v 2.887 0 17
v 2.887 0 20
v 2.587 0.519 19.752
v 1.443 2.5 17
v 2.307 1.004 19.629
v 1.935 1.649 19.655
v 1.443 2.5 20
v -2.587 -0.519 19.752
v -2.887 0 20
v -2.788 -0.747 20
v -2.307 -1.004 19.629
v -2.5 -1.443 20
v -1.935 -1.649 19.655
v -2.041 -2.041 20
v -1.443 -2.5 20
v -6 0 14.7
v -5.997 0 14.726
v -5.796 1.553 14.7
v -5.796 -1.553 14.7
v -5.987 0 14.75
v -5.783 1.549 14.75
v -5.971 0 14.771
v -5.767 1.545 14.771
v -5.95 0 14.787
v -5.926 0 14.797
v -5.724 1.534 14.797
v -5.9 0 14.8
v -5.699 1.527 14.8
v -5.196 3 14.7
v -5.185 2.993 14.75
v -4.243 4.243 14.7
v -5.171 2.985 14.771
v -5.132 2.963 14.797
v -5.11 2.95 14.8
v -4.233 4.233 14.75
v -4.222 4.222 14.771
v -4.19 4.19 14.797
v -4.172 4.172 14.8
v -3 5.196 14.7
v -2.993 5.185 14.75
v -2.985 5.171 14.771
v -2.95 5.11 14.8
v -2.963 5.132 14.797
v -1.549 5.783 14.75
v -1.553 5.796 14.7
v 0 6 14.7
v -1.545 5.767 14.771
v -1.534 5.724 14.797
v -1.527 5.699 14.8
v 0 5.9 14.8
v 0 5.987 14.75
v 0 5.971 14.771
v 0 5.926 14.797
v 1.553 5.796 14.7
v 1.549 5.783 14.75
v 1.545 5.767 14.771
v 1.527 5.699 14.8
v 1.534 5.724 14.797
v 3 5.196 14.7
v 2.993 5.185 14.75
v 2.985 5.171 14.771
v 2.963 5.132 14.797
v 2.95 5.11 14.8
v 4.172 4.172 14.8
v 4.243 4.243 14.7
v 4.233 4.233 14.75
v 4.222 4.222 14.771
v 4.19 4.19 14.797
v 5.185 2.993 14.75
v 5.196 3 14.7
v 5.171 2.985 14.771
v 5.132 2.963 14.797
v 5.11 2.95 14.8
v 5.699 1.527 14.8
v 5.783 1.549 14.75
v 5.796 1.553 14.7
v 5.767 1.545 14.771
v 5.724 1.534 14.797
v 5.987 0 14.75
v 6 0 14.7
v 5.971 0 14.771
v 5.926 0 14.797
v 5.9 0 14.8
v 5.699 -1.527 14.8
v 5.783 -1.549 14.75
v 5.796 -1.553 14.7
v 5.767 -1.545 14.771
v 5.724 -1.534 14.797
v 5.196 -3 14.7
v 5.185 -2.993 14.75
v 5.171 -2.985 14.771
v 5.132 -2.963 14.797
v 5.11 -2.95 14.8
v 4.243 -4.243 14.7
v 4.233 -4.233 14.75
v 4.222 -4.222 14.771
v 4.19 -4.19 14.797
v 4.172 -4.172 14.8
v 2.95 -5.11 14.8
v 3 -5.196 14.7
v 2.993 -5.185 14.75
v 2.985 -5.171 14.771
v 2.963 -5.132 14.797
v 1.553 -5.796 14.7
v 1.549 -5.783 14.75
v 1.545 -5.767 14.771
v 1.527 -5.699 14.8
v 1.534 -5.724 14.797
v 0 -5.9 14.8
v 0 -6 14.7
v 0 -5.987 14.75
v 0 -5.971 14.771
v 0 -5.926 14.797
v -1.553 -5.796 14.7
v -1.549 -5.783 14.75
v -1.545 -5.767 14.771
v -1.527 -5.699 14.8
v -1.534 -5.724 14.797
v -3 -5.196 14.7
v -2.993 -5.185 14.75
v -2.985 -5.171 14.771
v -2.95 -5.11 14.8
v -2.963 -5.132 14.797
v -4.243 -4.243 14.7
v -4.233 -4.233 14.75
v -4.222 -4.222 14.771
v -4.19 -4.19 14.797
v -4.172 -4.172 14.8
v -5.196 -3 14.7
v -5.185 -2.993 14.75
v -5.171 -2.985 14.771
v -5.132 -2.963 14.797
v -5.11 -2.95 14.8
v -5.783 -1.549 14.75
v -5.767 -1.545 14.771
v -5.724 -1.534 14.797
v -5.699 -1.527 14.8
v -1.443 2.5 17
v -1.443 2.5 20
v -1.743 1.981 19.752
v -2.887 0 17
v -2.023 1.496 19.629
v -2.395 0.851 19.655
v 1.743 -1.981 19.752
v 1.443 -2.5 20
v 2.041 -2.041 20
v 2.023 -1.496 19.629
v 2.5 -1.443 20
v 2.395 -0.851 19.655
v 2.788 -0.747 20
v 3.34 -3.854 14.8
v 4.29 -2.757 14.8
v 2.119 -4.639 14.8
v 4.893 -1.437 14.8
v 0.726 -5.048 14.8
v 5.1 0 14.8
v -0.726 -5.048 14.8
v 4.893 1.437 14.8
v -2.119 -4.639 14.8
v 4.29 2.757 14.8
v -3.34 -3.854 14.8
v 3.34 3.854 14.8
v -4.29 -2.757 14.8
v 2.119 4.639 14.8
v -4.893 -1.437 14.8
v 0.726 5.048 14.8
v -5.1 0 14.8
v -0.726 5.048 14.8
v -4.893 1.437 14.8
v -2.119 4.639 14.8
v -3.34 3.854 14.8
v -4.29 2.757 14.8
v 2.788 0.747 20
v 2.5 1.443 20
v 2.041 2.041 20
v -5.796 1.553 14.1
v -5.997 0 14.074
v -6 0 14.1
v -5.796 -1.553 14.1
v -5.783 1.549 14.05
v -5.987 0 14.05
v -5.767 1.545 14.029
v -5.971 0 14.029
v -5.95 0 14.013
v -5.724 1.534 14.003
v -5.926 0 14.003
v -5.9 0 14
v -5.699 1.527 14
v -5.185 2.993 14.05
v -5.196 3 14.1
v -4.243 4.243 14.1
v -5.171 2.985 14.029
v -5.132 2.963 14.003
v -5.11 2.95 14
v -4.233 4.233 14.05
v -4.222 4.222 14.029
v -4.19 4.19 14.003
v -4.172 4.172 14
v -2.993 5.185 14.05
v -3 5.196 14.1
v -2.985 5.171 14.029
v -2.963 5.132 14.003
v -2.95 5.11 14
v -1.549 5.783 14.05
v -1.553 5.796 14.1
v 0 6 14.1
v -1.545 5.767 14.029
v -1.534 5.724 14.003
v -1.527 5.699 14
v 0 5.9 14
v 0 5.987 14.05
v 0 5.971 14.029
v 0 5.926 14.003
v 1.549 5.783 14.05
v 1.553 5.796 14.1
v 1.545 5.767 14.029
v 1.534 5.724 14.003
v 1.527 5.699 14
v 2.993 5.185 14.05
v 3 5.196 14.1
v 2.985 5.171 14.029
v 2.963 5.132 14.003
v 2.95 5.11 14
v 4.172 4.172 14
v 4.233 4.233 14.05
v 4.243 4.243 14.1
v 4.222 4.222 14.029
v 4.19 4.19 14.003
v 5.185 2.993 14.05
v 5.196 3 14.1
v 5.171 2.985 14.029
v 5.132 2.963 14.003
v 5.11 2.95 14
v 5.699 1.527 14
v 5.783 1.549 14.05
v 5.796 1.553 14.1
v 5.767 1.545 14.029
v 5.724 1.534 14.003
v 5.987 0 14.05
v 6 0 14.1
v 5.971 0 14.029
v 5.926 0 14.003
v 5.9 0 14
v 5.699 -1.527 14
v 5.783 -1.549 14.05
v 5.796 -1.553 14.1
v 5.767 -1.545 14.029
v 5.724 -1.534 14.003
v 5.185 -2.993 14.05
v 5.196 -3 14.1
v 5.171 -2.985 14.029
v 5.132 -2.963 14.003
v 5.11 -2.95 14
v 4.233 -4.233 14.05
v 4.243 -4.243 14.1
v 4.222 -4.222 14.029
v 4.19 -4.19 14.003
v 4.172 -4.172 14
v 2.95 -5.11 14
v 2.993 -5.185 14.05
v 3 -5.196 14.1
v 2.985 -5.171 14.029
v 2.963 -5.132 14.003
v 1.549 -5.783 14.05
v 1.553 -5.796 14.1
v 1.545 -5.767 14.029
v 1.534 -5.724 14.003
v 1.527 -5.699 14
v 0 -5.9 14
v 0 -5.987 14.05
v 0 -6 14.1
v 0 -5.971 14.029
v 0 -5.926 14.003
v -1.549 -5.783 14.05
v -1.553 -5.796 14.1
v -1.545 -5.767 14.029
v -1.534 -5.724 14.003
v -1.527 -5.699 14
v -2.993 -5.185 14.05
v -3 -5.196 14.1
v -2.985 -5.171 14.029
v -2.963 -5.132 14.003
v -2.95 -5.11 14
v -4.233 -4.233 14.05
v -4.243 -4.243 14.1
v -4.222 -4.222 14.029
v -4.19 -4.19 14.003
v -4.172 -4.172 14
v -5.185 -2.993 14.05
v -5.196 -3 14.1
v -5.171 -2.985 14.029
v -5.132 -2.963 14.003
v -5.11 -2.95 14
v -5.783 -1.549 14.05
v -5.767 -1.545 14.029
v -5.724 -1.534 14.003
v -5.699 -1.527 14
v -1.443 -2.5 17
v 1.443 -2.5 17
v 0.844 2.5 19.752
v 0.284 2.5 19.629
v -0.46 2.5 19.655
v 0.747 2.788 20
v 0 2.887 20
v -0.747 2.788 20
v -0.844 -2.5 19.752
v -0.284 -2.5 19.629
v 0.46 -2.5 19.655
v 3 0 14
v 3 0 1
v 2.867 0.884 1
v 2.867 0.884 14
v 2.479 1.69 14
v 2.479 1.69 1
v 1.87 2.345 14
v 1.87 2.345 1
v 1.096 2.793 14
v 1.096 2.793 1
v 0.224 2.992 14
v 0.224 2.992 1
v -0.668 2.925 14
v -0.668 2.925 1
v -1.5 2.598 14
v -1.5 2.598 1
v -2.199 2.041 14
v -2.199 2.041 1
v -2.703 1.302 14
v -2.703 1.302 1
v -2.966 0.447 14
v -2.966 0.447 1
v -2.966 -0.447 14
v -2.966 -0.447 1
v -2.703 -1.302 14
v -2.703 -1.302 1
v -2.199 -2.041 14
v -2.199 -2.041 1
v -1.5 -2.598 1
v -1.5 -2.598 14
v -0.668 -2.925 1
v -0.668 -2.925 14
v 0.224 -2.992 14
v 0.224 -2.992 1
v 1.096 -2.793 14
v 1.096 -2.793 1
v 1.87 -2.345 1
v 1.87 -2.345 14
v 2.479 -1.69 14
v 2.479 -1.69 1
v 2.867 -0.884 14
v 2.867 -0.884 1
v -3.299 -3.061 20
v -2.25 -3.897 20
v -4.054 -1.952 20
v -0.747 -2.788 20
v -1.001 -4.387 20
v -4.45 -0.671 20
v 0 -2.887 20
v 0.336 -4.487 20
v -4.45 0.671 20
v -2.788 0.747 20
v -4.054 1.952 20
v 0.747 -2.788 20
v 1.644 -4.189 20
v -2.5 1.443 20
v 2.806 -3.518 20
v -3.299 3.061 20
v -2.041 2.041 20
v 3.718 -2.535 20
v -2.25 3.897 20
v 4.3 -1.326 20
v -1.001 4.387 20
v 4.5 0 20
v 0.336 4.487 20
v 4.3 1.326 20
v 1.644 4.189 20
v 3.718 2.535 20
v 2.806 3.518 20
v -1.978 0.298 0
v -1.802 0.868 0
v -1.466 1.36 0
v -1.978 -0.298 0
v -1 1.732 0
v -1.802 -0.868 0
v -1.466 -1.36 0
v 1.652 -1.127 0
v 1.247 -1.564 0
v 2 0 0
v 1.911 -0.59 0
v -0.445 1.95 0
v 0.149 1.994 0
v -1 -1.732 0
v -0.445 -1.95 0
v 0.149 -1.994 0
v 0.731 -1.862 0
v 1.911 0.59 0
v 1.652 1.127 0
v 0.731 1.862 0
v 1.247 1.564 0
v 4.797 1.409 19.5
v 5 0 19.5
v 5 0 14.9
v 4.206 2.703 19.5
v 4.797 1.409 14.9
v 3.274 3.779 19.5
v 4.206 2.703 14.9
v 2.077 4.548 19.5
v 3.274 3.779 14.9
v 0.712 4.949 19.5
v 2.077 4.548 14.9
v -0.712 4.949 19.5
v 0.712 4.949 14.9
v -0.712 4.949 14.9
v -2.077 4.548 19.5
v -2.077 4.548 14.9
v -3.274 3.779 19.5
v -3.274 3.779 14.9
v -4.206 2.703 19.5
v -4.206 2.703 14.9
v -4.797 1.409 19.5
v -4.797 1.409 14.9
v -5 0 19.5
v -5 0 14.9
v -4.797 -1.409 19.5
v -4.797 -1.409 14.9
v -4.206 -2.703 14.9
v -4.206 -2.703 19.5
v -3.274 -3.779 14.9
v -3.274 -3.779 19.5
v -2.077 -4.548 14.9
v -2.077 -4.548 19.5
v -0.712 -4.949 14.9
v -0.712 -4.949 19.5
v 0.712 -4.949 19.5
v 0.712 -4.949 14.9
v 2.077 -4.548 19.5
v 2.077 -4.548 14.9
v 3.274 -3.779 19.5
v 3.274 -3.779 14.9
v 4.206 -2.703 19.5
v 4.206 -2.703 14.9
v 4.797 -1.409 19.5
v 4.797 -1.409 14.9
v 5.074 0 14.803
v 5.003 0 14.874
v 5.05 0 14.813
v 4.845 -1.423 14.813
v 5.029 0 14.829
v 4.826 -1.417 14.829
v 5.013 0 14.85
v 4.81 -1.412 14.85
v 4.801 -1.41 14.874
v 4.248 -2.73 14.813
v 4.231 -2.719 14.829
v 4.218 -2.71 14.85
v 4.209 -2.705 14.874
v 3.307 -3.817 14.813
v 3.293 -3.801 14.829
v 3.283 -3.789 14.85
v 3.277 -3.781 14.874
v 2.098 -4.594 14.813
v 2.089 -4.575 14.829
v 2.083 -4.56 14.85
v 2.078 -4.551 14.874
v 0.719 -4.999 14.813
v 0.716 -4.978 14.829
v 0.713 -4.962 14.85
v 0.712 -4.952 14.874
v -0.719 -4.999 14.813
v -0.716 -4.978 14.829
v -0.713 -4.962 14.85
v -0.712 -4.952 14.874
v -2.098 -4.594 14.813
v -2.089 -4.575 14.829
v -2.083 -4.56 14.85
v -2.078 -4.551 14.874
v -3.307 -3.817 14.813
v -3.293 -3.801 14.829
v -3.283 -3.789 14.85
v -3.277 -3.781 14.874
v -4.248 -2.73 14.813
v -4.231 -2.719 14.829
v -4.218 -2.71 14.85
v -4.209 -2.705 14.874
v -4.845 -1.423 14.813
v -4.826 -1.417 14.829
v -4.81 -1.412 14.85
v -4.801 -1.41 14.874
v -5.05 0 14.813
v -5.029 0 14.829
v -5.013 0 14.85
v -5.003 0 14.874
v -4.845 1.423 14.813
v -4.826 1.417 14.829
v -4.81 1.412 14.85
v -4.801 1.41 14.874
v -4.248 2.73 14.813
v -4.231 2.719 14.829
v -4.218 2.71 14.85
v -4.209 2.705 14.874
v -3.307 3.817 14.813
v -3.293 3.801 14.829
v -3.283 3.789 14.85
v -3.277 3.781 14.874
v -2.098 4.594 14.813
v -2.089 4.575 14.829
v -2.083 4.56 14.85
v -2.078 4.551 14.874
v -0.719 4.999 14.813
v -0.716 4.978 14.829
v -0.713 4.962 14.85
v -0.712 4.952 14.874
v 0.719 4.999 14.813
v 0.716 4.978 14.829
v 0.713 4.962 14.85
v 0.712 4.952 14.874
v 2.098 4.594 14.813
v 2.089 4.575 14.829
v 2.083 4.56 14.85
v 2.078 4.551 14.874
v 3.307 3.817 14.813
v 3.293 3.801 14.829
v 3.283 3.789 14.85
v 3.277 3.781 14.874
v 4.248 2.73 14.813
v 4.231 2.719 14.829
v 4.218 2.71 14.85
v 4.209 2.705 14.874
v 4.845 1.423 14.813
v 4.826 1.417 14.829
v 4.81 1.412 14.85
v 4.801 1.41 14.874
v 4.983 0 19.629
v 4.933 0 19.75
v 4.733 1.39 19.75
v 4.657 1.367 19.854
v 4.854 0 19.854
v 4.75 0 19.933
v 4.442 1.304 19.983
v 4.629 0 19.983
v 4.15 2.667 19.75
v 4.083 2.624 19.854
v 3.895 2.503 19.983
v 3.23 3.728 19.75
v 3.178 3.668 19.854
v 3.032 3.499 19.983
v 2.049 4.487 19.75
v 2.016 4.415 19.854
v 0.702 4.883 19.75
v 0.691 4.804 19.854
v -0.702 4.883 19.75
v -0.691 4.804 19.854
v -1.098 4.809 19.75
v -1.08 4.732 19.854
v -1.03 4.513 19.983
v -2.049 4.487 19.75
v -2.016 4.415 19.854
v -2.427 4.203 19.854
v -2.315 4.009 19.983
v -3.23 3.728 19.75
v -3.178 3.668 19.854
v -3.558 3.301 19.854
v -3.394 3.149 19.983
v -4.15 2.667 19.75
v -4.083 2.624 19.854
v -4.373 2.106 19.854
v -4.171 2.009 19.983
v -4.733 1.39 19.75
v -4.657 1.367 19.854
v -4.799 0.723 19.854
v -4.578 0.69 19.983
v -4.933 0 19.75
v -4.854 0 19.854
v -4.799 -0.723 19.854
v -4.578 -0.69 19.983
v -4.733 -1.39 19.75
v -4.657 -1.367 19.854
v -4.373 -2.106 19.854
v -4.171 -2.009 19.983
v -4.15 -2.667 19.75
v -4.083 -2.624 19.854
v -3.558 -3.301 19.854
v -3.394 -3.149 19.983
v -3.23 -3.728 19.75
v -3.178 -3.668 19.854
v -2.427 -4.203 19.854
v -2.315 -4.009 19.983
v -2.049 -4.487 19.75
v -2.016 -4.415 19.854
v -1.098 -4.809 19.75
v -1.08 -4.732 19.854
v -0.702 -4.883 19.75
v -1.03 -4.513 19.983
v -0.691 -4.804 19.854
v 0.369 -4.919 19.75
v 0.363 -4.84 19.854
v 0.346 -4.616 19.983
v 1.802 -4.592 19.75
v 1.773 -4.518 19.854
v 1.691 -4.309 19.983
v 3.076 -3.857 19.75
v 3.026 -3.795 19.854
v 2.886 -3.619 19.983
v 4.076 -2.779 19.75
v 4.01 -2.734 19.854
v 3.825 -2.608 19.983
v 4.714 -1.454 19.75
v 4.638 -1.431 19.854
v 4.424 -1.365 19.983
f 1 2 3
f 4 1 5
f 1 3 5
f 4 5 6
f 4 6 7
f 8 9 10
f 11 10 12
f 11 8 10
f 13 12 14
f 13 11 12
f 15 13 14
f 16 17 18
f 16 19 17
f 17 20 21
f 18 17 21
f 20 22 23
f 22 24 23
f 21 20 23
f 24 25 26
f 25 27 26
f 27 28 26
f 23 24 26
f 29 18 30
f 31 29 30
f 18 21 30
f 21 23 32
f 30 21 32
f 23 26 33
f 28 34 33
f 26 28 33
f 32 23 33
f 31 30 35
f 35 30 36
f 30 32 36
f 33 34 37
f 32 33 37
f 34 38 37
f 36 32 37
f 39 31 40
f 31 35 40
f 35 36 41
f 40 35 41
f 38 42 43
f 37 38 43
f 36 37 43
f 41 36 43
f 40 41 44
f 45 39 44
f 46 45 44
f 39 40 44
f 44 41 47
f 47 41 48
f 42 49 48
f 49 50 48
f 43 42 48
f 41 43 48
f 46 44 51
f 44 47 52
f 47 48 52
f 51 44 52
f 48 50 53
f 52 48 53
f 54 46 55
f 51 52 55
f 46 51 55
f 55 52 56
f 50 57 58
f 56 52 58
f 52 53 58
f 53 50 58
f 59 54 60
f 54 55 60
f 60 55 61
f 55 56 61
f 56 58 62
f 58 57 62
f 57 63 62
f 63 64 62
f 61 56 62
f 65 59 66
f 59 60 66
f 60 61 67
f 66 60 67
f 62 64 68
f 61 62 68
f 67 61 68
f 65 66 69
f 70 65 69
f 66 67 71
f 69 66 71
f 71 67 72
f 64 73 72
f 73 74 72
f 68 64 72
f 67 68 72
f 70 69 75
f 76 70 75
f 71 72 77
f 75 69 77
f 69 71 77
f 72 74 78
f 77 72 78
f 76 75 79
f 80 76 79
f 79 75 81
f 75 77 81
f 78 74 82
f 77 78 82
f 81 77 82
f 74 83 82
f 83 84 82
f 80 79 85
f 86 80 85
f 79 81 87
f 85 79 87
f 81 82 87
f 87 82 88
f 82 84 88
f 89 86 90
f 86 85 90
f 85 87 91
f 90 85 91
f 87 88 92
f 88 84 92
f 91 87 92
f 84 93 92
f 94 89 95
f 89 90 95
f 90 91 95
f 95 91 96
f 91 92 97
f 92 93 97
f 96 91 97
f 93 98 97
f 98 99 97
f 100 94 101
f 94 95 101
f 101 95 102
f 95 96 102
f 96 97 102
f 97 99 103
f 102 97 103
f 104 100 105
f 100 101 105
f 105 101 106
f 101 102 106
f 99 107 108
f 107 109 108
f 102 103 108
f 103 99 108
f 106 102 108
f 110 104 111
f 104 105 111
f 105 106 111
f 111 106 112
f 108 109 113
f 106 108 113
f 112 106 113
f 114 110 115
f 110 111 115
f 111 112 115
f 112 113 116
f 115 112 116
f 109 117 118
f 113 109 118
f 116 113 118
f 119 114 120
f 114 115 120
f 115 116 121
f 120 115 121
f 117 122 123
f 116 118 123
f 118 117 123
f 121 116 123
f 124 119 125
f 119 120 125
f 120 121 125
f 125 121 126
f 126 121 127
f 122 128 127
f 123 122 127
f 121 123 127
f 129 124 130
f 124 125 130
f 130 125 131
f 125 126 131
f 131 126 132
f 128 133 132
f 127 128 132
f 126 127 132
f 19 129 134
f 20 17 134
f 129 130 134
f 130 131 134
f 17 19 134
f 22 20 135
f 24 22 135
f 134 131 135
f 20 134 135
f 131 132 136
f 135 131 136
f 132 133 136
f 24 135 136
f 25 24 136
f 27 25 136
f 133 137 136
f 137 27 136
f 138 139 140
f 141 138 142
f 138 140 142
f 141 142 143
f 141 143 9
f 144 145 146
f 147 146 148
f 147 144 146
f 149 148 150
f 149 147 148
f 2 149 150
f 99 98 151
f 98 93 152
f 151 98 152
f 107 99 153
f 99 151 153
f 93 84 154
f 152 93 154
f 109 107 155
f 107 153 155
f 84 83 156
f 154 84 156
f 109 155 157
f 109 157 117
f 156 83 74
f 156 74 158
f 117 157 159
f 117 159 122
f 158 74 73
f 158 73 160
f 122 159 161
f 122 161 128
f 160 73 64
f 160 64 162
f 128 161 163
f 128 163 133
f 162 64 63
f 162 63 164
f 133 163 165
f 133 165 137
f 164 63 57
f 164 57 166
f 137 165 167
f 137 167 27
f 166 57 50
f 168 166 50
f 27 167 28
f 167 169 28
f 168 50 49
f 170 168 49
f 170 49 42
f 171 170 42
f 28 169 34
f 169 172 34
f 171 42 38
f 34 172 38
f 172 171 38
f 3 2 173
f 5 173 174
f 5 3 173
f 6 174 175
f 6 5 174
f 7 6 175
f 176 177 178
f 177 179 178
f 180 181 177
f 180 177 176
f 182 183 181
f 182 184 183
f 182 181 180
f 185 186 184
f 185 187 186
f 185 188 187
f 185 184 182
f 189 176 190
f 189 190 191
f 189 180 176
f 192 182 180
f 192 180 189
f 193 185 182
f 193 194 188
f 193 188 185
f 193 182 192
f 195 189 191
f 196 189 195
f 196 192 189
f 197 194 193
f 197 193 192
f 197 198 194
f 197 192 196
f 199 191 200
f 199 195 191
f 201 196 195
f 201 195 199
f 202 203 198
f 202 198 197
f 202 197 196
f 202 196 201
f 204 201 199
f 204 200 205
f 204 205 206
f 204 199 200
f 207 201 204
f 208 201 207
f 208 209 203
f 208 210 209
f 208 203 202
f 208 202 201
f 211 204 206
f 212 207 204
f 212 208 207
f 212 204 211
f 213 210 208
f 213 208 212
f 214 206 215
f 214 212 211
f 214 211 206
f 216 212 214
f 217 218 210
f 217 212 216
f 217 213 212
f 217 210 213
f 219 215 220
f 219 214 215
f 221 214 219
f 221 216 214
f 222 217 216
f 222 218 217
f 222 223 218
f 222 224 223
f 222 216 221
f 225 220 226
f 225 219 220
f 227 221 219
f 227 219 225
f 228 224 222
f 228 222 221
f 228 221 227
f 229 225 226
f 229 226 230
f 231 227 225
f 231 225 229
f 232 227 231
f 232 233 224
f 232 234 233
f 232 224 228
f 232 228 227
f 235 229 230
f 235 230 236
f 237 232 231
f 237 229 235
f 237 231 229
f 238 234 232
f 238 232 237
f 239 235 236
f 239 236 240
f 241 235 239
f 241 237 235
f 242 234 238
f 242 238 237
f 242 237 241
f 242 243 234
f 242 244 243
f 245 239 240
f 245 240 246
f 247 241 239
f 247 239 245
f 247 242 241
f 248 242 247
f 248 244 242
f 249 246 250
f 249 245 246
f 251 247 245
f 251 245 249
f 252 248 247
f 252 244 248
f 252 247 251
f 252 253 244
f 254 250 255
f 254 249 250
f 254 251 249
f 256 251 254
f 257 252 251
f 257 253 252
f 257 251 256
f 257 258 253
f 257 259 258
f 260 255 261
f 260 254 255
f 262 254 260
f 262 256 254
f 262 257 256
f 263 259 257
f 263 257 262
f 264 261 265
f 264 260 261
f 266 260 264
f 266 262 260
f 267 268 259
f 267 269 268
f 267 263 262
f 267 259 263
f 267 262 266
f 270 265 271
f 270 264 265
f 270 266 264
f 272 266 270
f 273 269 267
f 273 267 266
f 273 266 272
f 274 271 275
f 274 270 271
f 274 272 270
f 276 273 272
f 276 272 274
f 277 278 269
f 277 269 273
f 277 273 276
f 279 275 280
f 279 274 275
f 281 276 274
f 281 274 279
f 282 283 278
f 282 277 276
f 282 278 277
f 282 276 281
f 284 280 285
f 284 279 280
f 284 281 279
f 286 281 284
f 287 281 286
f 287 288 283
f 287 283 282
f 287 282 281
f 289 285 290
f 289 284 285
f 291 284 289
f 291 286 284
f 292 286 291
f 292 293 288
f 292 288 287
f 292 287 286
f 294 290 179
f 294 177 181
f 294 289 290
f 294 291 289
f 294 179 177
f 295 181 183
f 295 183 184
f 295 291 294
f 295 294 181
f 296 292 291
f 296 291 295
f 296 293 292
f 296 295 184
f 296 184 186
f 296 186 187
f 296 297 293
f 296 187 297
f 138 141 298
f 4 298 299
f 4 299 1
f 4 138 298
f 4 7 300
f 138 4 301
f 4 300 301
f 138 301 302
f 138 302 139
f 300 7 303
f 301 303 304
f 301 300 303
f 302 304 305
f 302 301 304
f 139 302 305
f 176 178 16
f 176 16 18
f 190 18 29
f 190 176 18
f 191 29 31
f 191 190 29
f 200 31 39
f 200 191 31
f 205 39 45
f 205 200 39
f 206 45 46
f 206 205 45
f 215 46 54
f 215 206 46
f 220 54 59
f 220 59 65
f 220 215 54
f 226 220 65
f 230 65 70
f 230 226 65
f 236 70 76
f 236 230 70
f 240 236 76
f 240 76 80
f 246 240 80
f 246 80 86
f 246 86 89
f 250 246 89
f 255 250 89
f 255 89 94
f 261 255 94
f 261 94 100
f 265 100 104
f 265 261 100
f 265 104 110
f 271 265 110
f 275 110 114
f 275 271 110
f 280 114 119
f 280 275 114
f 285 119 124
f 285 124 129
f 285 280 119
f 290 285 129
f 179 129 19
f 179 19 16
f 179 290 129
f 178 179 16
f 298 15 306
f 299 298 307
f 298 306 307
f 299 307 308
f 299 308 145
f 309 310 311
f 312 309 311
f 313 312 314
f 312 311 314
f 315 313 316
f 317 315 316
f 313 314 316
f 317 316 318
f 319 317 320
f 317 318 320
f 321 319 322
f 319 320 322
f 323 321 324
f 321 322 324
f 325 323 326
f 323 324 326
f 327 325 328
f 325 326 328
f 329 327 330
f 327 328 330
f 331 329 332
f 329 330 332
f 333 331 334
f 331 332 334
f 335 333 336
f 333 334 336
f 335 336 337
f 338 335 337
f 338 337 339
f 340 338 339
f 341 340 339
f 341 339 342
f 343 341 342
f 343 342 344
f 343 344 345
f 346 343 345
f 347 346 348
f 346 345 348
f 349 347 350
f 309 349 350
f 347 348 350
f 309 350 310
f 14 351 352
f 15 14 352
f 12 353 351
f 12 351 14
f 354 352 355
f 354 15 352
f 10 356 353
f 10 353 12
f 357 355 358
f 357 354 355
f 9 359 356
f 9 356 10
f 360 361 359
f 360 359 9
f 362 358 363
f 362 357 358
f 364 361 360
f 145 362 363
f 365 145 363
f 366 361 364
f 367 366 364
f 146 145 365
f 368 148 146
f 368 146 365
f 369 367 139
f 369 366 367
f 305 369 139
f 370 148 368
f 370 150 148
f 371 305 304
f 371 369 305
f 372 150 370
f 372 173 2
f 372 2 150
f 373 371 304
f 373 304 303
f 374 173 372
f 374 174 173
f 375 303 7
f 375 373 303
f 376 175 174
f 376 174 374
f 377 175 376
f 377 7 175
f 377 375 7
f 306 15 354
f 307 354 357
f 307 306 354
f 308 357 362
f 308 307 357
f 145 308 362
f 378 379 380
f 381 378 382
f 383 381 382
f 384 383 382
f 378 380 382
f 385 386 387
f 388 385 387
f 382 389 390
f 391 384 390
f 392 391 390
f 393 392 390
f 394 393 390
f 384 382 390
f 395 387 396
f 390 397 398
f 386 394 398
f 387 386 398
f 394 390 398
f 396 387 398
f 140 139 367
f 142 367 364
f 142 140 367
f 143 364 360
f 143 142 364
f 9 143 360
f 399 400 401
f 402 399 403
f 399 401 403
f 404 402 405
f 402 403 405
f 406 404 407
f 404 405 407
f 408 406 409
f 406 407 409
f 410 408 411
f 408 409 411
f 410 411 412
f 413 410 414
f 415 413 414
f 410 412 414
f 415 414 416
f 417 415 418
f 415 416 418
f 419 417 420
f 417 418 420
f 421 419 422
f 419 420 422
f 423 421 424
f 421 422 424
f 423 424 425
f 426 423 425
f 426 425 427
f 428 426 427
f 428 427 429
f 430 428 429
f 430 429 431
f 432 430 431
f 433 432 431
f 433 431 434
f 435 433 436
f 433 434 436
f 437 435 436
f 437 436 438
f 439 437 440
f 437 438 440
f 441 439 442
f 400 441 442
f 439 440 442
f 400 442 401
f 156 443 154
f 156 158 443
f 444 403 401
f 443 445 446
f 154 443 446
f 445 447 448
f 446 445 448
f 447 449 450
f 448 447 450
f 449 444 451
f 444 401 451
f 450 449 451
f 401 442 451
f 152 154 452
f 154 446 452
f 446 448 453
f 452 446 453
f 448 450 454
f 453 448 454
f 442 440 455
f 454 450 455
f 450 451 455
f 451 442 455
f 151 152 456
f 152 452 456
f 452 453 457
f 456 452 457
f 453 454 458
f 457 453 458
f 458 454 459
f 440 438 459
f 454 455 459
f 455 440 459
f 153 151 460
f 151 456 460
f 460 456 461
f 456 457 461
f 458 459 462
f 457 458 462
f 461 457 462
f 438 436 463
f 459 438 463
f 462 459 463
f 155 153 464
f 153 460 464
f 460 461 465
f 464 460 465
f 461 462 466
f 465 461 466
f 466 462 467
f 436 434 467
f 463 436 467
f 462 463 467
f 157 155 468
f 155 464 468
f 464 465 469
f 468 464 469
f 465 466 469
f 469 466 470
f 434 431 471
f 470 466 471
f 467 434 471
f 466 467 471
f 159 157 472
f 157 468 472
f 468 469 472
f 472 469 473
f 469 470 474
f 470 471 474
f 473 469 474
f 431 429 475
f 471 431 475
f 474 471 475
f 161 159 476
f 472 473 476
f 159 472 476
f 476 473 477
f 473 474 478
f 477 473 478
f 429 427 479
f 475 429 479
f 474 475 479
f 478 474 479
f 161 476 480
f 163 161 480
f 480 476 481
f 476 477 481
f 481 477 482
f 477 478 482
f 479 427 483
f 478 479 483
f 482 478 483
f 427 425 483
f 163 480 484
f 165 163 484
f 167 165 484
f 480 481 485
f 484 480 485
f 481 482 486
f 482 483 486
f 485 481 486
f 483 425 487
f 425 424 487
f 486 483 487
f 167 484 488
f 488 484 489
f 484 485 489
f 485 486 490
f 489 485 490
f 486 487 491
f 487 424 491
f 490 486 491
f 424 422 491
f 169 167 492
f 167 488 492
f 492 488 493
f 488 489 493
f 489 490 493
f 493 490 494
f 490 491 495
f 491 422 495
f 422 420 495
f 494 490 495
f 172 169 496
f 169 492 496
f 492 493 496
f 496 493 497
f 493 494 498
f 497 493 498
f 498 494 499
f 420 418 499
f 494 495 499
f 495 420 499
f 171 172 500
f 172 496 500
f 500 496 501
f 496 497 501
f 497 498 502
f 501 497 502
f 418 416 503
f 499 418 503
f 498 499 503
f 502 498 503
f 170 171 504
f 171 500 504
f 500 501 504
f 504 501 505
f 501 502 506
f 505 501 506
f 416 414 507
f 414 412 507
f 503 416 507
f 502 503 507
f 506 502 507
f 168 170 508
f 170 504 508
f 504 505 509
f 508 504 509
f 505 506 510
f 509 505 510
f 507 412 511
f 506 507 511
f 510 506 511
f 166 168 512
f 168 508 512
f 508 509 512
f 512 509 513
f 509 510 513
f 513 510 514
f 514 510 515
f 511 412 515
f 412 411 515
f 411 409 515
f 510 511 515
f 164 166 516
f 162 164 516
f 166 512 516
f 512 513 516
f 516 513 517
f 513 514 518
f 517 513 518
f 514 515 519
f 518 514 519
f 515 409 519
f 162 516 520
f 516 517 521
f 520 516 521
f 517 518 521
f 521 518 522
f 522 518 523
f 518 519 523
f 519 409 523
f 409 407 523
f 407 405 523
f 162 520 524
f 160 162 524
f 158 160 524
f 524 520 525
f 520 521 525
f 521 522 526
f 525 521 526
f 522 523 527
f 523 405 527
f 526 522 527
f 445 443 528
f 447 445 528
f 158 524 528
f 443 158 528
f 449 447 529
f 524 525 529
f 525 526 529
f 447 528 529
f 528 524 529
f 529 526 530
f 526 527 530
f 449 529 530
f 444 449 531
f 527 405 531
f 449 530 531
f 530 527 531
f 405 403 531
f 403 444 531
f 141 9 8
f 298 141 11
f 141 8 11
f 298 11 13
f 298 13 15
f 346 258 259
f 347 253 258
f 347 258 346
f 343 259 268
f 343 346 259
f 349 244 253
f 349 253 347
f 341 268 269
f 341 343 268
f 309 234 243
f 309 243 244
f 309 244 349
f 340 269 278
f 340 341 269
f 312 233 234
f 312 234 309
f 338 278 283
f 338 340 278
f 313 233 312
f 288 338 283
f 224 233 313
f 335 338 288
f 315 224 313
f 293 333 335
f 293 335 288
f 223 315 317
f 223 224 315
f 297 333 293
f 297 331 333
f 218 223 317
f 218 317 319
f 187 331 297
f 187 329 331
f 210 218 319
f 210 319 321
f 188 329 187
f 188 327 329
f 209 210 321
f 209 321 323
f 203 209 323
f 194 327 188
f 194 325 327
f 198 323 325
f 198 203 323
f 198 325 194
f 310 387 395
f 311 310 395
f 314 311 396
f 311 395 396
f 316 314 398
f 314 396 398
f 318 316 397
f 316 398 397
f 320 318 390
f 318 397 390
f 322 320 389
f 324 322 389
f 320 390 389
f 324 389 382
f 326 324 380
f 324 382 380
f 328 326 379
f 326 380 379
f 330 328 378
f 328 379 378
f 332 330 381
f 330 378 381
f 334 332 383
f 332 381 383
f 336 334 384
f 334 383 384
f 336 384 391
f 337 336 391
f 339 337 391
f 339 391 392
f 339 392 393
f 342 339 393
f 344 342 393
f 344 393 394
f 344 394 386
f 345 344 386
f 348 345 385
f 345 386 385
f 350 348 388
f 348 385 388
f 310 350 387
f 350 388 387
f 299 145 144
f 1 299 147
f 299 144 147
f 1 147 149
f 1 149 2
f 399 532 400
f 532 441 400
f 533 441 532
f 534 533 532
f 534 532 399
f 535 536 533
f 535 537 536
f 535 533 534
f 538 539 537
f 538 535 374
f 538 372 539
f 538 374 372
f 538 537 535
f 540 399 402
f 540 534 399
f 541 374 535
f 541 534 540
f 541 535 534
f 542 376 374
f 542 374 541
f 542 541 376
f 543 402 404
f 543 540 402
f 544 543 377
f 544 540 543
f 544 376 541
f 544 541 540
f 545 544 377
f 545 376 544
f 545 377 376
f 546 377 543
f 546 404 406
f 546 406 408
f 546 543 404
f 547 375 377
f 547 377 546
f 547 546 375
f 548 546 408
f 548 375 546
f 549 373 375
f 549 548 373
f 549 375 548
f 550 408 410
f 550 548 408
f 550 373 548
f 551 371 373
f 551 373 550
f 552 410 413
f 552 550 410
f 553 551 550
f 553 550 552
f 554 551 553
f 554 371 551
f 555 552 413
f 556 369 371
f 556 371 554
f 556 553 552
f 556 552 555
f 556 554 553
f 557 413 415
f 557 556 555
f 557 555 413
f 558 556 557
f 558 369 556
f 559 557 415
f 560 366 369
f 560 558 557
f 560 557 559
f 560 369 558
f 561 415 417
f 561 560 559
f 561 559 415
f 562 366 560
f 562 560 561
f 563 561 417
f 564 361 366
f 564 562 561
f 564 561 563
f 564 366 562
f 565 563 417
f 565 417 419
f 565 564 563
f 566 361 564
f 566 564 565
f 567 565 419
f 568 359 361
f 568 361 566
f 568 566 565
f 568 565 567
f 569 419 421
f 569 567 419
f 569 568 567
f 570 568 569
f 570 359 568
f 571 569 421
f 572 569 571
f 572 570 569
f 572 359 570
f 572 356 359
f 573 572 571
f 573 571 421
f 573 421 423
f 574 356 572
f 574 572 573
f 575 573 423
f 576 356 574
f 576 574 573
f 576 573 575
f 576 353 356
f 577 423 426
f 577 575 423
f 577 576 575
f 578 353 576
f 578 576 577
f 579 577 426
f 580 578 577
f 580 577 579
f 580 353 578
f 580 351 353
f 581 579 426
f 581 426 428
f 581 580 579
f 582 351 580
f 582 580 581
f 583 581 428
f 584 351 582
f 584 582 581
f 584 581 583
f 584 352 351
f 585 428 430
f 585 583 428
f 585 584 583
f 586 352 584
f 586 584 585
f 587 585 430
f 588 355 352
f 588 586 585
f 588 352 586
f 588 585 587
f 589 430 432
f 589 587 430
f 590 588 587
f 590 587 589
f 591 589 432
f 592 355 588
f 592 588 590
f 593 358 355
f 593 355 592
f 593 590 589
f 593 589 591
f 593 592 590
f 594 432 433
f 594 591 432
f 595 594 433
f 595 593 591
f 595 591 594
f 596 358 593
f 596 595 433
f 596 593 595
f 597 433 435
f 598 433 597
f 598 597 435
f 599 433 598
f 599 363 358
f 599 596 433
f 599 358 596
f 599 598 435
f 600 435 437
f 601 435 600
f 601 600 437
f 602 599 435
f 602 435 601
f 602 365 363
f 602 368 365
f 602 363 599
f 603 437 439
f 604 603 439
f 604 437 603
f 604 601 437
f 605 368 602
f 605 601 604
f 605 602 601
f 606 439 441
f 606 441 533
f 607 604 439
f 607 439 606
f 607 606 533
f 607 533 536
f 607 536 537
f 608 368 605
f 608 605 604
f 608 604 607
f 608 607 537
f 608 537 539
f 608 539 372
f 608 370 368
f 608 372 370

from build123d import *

# Parameters (mm, degrees)
SCHIZZO1_R                   = 3
ESTRUSIONE_ESTRUSIONE1_DEPTH = 14
SMUSSO1_SIZE                 = 1
SCHIZZO6_R                   = 5
ESTRUSIONE_ESTRUSIONE3_DEPTH = 6
TAGLIO_ESTRUSIONE3_DEPTH     = 3
SCHIZZO8_R                   = 2.886751346
TAGLIO_ESTRUSIONE4_DEPTH     = 1
TAGLIO_ESTRUSIONE4_TAPER     = 45
RACCORDO1_R                  = 0.5
SCHIZZO9_R                   = 6
SCHIZZO9_R_2                 = 5
ESTRUSIONE_ESTRUSIONE4_DEPTH = 0.8
RACCORDO3_R                  = 0.1


with BuildPart() as part:
    # Schizzo1 → Estrusione-Estrusione1 (new body)
    with BuildSketch(Plane.XY):
        Circle(SCHIZZO1_R)
    extrude(amount=ESTRUSIONE_ESTRUSIONE1_DEPTH)

    # Smusso1
    smusso1_edges = [part.edges().sort_by_distance(p)[0] for p in [
        (-3, 0, 0),
    ]]
    chamfer(smusso1_edges, length=SMUSSO1_SIZE)

    # Schizzo6 → Estrusione-Estrusione3 (add)
    with BuildSketch(Plane.XY.offset(14)):
        Circle(SCHIZZO6_R)
    extrude(amount=ESTRUSIONE_ESTRUSIONE3_DEPTH)

    # Schizzo7 → Taglio-Estrusione3 (cut)
    with BuildSketch(Plane.XY.offset(20)):
        Polygon((1.443375673, 2.5), (-1.443375673, 2.5), (-2.886751346, 0), (-1.443375673, -2.5), (1.443375673, -2.5), (2.886751346, 0), align=None)
    extrude(amount=-TAGLIO_ESTRUSIONE3_DEPTH, mode=Mode.SUBTRACT)

    # Schizzo8 → Taglio-Estrusione4 (cut)
    with BuildSketch(Plane.XY.offset(20)):
        Circle(SCHIZZO8_R)
    extrude(amount=-TAGLIO_ESTRUSIONE4_DEPTH, taper=TAGLIO_ESTRUSIONE4_TAPER, mode=Mode.SUBTRACT)

    # Raccordo1
    raccordo1_edges = [part.edges().sort_by_distance(p)[0] for p in [
        (-5, 0, 20),
    ]]
    fillet(raccordo1_edges, radius=RACCORDO1_R)

    # Schizzo9 → Estrusione-Estrusione4 (add)
    with BuildSketch(Plane(origin=(0, 0, 14), x_dir=(-1, 0, 0), z_dir=(0, 0, -1))):
        Circle(SCHIZZO9_R)
        Circle(SCHIZZO9_R_2, mode=Mode.SUBTRACT)
    extrude(amount=-ESTRUSIONE_ESTRUSIONE4_DEPTH)

    # Raccordo3
    raccordo3_edges = [part.edges().sort_by_distance(p)[0] for p in [
        (-5, 0, 14.8),
        (6, 0, 14.8),
        (6, 0, 14),
    ]]
    fillet(raccordo3_edges, radius=RACCORDO3_R)


solid = part.part
